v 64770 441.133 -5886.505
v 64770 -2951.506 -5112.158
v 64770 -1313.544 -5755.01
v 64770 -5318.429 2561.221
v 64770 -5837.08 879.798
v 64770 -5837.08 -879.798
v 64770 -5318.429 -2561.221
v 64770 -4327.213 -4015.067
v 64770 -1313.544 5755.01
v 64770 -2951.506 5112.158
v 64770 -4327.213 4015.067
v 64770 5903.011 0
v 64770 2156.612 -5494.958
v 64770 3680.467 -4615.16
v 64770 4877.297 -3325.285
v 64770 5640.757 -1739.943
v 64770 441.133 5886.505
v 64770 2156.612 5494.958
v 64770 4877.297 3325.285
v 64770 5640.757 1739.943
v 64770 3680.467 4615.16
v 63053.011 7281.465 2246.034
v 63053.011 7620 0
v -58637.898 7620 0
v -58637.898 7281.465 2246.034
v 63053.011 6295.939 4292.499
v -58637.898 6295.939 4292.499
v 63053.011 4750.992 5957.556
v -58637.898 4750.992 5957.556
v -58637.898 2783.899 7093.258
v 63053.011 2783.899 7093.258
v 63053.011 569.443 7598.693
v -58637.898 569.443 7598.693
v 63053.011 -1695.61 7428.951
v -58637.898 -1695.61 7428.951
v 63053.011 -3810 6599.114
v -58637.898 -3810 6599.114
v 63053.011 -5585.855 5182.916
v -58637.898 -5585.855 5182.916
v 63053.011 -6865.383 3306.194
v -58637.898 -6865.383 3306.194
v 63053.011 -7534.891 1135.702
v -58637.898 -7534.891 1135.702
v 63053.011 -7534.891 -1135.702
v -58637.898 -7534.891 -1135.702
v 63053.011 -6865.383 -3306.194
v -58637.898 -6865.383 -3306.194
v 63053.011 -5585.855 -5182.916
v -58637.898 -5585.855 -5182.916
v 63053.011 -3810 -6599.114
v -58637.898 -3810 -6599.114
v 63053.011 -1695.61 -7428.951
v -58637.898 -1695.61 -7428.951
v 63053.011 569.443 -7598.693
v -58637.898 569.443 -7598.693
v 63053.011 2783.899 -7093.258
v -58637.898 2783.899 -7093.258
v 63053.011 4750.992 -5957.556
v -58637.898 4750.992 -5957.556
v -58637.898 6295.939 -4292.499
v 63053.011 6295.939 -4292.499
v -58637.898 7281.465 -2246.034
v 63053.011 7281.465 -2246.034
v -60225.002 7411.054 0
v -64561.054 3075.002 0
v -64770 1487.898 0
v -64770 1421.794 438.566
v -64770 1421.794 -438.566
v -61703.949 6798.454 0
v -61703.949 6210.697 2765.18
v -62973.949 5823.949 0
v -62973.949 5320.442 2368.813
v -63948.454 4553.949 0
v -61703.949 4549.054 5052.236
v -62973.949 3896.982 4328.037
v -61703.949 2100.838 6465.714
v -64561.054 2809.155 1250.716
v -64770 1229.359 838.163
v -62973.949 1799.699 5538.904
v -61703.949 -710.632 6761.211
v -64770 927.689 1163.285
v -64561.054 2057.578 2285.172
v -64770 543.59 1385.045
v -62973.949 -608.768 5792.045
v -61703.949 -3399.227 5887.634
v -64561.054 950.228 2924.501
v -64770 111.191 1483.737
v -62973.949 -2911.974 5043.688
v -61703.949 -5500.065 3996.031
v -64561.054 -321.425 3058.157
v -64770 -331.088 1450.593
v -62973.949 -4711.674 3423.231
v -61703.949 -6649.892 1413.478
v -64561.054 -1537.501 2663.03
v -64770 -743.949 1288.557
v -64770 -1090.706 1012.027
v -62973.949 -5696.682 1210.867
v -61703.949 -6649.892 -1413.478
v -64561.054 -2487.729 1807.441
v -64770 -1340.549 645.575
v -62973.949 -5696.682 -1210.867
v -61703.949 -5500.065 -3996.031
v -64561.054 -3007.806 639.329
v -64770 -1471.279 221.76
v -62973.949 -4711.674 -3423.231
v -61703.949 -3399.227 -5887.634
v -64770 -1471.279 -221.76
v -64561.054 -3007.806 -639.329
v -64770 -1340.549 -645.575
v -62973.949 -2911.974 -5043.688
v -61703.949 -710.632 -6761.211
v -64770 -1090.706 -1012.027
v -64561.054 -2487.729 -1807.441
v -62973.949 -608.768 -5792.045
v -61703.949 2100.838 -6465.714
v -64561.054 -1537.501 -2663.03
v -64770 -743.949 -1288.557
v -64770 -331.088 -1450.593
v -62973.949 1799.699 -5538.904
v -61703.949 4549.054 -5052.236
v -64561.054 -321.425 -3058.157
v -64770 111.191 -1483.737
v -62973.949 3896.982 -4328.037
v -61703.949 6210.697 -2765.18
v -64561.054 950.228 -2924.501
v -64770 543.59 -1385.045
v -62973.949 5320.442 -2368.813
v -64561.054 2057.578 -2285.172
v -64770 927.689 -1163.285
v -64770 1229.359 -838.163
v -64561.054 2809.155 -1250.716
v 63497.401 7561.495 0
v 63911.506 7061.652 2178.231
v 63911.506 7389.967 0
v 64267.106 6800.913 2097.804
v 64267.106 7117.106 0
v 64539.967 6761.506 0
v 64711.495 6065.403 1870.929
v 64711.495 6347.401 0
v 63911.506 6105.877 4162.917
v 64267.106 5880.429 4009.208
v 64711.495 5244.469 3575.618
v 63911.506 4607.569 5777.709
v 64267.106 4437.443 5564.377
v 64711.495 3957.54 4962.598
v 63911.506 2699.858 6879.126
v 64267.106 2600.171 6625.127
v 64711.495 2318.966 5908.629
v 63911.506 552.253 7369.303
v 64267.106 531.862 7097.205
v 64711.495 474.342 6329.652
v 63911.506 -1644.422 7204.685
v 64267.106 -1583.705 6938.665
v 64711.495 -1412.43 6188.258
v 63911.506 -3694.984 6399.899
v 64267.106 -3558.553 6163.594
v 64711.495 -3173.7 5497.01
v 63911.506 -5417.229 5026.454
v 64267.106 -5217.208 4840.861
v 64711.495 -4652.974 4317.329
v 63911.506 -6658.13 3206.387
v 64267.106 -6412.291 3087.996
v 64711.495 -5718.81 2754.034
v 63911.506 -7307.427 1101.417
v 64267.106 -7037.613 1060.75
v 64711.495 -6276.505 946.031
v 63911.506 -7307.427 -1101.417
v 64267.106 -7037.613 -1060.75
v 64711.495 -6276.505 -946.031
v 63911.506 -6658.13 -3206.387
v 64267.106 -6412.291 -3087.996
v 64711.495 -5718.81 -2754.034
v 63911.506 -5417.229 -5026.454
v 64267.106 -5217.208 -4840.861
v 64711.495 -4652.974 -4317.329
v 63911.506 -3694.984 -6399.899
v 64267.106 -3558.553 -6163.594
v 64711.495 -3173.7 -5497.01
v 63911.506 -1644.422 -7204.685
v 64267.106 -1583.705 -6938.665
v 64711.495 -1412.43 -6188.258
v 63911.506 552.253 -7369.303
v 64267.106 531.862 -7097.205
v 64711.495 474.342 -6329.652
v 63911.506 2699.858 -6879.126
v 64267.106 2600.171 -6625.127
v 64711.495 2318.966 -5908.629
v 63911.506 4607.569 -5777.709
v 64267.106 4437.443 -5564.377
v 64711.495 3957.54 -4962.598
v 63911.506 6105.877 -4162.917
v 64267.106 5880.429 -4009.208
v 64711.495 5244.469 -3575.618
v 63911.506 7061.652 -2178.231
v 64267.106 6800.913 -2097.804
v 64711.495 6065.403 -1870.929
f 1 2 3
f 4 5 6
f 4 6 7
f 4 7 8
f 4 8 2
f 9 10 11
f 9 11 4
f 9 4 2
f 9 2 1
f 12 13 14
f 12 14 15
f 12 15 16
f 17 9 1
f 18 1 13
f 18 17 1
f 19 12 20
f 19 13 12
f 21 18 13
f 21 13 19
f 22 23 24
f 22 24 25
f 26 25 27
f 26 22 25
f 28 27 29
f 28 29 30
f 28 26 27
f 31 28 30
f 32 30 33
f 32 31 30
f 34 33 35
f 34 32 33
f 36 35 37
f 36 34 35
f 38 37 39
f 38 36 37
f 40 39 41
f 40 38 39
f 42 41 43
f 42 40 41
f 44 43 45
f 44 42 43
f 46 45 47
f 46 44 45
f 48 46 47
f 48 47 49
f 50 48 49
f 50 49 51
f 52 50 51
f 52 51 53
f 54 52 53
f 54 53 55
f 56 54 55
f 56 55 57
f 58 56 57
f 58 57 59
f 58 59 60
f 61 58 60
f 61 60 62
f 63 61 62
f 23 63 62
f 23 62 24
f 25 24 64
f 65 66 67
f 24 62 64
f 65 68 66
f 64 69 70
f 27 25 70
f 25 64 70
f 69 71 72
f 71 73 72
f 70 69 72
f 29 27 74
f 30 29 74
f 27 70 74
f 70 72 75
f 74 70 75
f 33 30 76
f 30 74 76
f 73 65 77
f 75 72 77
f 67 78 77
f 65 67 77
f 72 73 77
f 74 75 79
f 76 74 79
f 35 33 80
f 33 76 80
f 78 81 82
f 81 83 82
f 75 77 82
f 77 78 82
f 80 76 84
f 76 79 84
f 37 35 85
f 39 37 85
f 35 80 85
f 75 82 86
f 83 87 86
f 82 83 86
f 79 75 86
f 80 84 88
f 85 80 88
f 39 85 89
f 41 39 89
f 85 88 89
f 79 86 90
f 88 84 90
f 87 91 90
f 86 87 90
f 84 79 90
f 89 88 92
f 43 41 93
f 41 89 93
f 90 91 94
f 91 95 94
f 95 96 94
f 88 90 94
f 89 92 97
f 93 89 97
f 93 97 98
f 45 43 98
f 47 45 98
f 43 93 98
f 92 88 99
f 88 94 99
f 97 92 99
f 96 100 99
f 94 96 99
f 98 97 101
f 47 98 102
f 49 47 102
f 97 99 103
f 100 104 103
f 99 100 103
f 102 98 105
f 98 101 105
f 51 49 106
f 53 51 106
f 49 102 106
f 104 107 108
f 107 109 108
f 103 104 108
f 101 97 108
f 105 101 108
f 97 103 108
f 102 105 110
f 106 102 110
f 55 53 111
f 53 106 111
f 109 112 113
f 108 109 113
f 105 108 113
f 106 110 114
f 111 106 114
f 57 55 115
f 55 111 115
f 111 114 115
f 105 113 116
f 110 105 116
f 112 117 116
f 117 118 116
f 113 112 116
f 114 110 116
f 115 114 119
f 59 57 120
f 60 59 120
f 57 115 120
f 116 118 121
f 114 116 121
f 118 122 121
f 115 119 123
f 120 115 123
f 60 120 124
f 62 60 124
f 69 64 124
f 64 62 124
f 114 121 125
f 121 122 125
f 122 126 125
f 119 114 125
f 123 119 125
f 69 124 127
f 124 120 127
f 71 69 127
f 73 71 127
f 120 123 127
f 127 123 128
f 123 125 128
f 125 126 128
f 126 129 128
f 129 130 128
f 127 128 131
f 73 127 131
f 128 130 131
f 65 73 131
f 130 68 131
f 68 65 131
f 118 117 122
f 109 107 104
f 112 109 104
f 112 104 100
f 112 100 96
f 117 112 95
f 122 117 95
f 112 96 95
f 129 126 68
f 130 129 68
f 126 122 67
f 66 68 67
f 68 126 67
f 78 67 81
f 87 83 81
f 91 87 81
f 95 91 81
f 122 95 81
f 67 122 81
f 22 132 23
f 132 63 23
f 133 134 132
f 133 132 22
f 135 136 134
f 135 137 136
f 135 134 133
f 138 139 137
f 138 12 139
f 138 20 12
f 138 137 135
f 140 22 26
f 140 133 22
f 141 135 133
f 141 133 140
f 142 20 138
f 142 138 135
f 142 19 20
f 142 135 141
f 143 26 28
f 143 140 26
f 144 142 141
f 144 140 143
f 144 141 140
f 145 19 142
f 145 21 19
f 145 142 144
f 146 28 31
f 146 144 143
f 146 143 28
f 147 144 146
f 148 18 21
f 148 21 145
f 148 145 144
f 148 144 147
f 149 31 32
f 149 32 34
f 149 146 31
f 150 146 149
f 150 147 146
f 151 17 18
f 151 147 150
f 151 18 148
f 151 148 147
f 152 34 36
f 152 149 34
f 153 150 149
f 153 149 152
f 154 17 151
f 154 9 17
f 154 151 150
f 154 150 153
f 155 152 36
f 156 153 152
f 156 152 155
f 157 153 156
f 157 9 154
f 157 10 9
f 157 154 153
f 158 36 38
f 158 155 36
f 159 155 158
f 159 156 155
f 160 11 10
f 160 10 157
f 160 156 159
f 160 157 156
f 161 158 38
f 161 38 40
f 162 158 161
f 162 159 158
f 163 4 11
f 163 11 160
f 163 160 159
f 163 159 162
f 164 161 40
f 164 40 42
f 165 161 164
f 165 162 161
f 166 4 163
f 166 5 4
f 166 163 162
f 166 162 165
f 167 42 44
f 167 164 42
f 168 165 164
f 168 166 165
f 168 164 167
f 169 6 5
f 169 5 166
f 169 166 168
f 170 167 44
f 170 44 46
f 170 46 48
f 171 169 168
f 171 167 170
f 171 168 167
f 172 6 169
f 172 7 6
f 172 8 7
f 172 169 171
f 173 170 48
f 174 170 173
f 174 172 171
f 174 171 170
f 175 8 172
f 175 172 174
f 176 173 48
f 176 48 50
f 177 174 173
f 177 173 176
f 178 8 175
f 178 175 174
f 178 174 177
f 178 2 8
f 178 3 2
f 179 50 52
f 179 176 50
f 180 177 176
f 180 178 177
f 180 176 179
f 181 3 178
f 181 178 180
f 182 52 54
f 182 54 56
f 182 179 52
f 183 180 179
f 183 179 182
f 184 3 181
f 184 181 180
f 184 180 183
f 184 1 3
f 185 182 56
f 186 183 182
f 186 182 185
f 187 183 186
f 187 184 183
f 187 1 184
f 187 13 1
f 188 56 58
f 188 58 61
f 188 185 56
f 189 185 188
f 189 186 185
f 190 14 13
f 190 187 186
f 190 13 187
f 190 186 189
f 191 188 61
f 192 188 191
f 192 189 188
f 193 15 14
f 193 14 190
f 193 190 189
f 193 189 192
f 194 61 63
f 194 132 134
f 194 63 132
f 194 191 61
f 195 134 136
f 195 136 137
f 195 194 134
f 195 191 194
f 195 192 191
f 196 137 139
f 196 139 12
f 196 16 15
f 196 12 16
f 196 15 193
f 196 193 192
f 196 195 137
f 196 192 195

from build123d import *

# Parameters (mm, degrees)
F0_R     = 7620
F1_DEPTH = 64770
F2_R     = 6132.102448
F3_R     = 1716.988686


with BuildPart() as f1:
    # F0 (on Right) → F1 (new body, symmetric)
    with BuildSketch(Plane.YZ):
        Circle(F0_R)
    extrude(amount=F1_DEPTH, both=True)

    # F2
    f2_edges = [f1.edges().sort_by_distance(p)[0] for p in [
        (-64770, -7620, 0),
    ]]
    fillet(f2_edges, radius=F2_R)

    # F3
    f3_edges = [f1.edges().sort_by_distance(p)[0] for p in [
        (64770, -7620, 0),
    ]]
    fillet(f3_edges, radius=F3_R)


solid = f1.part
